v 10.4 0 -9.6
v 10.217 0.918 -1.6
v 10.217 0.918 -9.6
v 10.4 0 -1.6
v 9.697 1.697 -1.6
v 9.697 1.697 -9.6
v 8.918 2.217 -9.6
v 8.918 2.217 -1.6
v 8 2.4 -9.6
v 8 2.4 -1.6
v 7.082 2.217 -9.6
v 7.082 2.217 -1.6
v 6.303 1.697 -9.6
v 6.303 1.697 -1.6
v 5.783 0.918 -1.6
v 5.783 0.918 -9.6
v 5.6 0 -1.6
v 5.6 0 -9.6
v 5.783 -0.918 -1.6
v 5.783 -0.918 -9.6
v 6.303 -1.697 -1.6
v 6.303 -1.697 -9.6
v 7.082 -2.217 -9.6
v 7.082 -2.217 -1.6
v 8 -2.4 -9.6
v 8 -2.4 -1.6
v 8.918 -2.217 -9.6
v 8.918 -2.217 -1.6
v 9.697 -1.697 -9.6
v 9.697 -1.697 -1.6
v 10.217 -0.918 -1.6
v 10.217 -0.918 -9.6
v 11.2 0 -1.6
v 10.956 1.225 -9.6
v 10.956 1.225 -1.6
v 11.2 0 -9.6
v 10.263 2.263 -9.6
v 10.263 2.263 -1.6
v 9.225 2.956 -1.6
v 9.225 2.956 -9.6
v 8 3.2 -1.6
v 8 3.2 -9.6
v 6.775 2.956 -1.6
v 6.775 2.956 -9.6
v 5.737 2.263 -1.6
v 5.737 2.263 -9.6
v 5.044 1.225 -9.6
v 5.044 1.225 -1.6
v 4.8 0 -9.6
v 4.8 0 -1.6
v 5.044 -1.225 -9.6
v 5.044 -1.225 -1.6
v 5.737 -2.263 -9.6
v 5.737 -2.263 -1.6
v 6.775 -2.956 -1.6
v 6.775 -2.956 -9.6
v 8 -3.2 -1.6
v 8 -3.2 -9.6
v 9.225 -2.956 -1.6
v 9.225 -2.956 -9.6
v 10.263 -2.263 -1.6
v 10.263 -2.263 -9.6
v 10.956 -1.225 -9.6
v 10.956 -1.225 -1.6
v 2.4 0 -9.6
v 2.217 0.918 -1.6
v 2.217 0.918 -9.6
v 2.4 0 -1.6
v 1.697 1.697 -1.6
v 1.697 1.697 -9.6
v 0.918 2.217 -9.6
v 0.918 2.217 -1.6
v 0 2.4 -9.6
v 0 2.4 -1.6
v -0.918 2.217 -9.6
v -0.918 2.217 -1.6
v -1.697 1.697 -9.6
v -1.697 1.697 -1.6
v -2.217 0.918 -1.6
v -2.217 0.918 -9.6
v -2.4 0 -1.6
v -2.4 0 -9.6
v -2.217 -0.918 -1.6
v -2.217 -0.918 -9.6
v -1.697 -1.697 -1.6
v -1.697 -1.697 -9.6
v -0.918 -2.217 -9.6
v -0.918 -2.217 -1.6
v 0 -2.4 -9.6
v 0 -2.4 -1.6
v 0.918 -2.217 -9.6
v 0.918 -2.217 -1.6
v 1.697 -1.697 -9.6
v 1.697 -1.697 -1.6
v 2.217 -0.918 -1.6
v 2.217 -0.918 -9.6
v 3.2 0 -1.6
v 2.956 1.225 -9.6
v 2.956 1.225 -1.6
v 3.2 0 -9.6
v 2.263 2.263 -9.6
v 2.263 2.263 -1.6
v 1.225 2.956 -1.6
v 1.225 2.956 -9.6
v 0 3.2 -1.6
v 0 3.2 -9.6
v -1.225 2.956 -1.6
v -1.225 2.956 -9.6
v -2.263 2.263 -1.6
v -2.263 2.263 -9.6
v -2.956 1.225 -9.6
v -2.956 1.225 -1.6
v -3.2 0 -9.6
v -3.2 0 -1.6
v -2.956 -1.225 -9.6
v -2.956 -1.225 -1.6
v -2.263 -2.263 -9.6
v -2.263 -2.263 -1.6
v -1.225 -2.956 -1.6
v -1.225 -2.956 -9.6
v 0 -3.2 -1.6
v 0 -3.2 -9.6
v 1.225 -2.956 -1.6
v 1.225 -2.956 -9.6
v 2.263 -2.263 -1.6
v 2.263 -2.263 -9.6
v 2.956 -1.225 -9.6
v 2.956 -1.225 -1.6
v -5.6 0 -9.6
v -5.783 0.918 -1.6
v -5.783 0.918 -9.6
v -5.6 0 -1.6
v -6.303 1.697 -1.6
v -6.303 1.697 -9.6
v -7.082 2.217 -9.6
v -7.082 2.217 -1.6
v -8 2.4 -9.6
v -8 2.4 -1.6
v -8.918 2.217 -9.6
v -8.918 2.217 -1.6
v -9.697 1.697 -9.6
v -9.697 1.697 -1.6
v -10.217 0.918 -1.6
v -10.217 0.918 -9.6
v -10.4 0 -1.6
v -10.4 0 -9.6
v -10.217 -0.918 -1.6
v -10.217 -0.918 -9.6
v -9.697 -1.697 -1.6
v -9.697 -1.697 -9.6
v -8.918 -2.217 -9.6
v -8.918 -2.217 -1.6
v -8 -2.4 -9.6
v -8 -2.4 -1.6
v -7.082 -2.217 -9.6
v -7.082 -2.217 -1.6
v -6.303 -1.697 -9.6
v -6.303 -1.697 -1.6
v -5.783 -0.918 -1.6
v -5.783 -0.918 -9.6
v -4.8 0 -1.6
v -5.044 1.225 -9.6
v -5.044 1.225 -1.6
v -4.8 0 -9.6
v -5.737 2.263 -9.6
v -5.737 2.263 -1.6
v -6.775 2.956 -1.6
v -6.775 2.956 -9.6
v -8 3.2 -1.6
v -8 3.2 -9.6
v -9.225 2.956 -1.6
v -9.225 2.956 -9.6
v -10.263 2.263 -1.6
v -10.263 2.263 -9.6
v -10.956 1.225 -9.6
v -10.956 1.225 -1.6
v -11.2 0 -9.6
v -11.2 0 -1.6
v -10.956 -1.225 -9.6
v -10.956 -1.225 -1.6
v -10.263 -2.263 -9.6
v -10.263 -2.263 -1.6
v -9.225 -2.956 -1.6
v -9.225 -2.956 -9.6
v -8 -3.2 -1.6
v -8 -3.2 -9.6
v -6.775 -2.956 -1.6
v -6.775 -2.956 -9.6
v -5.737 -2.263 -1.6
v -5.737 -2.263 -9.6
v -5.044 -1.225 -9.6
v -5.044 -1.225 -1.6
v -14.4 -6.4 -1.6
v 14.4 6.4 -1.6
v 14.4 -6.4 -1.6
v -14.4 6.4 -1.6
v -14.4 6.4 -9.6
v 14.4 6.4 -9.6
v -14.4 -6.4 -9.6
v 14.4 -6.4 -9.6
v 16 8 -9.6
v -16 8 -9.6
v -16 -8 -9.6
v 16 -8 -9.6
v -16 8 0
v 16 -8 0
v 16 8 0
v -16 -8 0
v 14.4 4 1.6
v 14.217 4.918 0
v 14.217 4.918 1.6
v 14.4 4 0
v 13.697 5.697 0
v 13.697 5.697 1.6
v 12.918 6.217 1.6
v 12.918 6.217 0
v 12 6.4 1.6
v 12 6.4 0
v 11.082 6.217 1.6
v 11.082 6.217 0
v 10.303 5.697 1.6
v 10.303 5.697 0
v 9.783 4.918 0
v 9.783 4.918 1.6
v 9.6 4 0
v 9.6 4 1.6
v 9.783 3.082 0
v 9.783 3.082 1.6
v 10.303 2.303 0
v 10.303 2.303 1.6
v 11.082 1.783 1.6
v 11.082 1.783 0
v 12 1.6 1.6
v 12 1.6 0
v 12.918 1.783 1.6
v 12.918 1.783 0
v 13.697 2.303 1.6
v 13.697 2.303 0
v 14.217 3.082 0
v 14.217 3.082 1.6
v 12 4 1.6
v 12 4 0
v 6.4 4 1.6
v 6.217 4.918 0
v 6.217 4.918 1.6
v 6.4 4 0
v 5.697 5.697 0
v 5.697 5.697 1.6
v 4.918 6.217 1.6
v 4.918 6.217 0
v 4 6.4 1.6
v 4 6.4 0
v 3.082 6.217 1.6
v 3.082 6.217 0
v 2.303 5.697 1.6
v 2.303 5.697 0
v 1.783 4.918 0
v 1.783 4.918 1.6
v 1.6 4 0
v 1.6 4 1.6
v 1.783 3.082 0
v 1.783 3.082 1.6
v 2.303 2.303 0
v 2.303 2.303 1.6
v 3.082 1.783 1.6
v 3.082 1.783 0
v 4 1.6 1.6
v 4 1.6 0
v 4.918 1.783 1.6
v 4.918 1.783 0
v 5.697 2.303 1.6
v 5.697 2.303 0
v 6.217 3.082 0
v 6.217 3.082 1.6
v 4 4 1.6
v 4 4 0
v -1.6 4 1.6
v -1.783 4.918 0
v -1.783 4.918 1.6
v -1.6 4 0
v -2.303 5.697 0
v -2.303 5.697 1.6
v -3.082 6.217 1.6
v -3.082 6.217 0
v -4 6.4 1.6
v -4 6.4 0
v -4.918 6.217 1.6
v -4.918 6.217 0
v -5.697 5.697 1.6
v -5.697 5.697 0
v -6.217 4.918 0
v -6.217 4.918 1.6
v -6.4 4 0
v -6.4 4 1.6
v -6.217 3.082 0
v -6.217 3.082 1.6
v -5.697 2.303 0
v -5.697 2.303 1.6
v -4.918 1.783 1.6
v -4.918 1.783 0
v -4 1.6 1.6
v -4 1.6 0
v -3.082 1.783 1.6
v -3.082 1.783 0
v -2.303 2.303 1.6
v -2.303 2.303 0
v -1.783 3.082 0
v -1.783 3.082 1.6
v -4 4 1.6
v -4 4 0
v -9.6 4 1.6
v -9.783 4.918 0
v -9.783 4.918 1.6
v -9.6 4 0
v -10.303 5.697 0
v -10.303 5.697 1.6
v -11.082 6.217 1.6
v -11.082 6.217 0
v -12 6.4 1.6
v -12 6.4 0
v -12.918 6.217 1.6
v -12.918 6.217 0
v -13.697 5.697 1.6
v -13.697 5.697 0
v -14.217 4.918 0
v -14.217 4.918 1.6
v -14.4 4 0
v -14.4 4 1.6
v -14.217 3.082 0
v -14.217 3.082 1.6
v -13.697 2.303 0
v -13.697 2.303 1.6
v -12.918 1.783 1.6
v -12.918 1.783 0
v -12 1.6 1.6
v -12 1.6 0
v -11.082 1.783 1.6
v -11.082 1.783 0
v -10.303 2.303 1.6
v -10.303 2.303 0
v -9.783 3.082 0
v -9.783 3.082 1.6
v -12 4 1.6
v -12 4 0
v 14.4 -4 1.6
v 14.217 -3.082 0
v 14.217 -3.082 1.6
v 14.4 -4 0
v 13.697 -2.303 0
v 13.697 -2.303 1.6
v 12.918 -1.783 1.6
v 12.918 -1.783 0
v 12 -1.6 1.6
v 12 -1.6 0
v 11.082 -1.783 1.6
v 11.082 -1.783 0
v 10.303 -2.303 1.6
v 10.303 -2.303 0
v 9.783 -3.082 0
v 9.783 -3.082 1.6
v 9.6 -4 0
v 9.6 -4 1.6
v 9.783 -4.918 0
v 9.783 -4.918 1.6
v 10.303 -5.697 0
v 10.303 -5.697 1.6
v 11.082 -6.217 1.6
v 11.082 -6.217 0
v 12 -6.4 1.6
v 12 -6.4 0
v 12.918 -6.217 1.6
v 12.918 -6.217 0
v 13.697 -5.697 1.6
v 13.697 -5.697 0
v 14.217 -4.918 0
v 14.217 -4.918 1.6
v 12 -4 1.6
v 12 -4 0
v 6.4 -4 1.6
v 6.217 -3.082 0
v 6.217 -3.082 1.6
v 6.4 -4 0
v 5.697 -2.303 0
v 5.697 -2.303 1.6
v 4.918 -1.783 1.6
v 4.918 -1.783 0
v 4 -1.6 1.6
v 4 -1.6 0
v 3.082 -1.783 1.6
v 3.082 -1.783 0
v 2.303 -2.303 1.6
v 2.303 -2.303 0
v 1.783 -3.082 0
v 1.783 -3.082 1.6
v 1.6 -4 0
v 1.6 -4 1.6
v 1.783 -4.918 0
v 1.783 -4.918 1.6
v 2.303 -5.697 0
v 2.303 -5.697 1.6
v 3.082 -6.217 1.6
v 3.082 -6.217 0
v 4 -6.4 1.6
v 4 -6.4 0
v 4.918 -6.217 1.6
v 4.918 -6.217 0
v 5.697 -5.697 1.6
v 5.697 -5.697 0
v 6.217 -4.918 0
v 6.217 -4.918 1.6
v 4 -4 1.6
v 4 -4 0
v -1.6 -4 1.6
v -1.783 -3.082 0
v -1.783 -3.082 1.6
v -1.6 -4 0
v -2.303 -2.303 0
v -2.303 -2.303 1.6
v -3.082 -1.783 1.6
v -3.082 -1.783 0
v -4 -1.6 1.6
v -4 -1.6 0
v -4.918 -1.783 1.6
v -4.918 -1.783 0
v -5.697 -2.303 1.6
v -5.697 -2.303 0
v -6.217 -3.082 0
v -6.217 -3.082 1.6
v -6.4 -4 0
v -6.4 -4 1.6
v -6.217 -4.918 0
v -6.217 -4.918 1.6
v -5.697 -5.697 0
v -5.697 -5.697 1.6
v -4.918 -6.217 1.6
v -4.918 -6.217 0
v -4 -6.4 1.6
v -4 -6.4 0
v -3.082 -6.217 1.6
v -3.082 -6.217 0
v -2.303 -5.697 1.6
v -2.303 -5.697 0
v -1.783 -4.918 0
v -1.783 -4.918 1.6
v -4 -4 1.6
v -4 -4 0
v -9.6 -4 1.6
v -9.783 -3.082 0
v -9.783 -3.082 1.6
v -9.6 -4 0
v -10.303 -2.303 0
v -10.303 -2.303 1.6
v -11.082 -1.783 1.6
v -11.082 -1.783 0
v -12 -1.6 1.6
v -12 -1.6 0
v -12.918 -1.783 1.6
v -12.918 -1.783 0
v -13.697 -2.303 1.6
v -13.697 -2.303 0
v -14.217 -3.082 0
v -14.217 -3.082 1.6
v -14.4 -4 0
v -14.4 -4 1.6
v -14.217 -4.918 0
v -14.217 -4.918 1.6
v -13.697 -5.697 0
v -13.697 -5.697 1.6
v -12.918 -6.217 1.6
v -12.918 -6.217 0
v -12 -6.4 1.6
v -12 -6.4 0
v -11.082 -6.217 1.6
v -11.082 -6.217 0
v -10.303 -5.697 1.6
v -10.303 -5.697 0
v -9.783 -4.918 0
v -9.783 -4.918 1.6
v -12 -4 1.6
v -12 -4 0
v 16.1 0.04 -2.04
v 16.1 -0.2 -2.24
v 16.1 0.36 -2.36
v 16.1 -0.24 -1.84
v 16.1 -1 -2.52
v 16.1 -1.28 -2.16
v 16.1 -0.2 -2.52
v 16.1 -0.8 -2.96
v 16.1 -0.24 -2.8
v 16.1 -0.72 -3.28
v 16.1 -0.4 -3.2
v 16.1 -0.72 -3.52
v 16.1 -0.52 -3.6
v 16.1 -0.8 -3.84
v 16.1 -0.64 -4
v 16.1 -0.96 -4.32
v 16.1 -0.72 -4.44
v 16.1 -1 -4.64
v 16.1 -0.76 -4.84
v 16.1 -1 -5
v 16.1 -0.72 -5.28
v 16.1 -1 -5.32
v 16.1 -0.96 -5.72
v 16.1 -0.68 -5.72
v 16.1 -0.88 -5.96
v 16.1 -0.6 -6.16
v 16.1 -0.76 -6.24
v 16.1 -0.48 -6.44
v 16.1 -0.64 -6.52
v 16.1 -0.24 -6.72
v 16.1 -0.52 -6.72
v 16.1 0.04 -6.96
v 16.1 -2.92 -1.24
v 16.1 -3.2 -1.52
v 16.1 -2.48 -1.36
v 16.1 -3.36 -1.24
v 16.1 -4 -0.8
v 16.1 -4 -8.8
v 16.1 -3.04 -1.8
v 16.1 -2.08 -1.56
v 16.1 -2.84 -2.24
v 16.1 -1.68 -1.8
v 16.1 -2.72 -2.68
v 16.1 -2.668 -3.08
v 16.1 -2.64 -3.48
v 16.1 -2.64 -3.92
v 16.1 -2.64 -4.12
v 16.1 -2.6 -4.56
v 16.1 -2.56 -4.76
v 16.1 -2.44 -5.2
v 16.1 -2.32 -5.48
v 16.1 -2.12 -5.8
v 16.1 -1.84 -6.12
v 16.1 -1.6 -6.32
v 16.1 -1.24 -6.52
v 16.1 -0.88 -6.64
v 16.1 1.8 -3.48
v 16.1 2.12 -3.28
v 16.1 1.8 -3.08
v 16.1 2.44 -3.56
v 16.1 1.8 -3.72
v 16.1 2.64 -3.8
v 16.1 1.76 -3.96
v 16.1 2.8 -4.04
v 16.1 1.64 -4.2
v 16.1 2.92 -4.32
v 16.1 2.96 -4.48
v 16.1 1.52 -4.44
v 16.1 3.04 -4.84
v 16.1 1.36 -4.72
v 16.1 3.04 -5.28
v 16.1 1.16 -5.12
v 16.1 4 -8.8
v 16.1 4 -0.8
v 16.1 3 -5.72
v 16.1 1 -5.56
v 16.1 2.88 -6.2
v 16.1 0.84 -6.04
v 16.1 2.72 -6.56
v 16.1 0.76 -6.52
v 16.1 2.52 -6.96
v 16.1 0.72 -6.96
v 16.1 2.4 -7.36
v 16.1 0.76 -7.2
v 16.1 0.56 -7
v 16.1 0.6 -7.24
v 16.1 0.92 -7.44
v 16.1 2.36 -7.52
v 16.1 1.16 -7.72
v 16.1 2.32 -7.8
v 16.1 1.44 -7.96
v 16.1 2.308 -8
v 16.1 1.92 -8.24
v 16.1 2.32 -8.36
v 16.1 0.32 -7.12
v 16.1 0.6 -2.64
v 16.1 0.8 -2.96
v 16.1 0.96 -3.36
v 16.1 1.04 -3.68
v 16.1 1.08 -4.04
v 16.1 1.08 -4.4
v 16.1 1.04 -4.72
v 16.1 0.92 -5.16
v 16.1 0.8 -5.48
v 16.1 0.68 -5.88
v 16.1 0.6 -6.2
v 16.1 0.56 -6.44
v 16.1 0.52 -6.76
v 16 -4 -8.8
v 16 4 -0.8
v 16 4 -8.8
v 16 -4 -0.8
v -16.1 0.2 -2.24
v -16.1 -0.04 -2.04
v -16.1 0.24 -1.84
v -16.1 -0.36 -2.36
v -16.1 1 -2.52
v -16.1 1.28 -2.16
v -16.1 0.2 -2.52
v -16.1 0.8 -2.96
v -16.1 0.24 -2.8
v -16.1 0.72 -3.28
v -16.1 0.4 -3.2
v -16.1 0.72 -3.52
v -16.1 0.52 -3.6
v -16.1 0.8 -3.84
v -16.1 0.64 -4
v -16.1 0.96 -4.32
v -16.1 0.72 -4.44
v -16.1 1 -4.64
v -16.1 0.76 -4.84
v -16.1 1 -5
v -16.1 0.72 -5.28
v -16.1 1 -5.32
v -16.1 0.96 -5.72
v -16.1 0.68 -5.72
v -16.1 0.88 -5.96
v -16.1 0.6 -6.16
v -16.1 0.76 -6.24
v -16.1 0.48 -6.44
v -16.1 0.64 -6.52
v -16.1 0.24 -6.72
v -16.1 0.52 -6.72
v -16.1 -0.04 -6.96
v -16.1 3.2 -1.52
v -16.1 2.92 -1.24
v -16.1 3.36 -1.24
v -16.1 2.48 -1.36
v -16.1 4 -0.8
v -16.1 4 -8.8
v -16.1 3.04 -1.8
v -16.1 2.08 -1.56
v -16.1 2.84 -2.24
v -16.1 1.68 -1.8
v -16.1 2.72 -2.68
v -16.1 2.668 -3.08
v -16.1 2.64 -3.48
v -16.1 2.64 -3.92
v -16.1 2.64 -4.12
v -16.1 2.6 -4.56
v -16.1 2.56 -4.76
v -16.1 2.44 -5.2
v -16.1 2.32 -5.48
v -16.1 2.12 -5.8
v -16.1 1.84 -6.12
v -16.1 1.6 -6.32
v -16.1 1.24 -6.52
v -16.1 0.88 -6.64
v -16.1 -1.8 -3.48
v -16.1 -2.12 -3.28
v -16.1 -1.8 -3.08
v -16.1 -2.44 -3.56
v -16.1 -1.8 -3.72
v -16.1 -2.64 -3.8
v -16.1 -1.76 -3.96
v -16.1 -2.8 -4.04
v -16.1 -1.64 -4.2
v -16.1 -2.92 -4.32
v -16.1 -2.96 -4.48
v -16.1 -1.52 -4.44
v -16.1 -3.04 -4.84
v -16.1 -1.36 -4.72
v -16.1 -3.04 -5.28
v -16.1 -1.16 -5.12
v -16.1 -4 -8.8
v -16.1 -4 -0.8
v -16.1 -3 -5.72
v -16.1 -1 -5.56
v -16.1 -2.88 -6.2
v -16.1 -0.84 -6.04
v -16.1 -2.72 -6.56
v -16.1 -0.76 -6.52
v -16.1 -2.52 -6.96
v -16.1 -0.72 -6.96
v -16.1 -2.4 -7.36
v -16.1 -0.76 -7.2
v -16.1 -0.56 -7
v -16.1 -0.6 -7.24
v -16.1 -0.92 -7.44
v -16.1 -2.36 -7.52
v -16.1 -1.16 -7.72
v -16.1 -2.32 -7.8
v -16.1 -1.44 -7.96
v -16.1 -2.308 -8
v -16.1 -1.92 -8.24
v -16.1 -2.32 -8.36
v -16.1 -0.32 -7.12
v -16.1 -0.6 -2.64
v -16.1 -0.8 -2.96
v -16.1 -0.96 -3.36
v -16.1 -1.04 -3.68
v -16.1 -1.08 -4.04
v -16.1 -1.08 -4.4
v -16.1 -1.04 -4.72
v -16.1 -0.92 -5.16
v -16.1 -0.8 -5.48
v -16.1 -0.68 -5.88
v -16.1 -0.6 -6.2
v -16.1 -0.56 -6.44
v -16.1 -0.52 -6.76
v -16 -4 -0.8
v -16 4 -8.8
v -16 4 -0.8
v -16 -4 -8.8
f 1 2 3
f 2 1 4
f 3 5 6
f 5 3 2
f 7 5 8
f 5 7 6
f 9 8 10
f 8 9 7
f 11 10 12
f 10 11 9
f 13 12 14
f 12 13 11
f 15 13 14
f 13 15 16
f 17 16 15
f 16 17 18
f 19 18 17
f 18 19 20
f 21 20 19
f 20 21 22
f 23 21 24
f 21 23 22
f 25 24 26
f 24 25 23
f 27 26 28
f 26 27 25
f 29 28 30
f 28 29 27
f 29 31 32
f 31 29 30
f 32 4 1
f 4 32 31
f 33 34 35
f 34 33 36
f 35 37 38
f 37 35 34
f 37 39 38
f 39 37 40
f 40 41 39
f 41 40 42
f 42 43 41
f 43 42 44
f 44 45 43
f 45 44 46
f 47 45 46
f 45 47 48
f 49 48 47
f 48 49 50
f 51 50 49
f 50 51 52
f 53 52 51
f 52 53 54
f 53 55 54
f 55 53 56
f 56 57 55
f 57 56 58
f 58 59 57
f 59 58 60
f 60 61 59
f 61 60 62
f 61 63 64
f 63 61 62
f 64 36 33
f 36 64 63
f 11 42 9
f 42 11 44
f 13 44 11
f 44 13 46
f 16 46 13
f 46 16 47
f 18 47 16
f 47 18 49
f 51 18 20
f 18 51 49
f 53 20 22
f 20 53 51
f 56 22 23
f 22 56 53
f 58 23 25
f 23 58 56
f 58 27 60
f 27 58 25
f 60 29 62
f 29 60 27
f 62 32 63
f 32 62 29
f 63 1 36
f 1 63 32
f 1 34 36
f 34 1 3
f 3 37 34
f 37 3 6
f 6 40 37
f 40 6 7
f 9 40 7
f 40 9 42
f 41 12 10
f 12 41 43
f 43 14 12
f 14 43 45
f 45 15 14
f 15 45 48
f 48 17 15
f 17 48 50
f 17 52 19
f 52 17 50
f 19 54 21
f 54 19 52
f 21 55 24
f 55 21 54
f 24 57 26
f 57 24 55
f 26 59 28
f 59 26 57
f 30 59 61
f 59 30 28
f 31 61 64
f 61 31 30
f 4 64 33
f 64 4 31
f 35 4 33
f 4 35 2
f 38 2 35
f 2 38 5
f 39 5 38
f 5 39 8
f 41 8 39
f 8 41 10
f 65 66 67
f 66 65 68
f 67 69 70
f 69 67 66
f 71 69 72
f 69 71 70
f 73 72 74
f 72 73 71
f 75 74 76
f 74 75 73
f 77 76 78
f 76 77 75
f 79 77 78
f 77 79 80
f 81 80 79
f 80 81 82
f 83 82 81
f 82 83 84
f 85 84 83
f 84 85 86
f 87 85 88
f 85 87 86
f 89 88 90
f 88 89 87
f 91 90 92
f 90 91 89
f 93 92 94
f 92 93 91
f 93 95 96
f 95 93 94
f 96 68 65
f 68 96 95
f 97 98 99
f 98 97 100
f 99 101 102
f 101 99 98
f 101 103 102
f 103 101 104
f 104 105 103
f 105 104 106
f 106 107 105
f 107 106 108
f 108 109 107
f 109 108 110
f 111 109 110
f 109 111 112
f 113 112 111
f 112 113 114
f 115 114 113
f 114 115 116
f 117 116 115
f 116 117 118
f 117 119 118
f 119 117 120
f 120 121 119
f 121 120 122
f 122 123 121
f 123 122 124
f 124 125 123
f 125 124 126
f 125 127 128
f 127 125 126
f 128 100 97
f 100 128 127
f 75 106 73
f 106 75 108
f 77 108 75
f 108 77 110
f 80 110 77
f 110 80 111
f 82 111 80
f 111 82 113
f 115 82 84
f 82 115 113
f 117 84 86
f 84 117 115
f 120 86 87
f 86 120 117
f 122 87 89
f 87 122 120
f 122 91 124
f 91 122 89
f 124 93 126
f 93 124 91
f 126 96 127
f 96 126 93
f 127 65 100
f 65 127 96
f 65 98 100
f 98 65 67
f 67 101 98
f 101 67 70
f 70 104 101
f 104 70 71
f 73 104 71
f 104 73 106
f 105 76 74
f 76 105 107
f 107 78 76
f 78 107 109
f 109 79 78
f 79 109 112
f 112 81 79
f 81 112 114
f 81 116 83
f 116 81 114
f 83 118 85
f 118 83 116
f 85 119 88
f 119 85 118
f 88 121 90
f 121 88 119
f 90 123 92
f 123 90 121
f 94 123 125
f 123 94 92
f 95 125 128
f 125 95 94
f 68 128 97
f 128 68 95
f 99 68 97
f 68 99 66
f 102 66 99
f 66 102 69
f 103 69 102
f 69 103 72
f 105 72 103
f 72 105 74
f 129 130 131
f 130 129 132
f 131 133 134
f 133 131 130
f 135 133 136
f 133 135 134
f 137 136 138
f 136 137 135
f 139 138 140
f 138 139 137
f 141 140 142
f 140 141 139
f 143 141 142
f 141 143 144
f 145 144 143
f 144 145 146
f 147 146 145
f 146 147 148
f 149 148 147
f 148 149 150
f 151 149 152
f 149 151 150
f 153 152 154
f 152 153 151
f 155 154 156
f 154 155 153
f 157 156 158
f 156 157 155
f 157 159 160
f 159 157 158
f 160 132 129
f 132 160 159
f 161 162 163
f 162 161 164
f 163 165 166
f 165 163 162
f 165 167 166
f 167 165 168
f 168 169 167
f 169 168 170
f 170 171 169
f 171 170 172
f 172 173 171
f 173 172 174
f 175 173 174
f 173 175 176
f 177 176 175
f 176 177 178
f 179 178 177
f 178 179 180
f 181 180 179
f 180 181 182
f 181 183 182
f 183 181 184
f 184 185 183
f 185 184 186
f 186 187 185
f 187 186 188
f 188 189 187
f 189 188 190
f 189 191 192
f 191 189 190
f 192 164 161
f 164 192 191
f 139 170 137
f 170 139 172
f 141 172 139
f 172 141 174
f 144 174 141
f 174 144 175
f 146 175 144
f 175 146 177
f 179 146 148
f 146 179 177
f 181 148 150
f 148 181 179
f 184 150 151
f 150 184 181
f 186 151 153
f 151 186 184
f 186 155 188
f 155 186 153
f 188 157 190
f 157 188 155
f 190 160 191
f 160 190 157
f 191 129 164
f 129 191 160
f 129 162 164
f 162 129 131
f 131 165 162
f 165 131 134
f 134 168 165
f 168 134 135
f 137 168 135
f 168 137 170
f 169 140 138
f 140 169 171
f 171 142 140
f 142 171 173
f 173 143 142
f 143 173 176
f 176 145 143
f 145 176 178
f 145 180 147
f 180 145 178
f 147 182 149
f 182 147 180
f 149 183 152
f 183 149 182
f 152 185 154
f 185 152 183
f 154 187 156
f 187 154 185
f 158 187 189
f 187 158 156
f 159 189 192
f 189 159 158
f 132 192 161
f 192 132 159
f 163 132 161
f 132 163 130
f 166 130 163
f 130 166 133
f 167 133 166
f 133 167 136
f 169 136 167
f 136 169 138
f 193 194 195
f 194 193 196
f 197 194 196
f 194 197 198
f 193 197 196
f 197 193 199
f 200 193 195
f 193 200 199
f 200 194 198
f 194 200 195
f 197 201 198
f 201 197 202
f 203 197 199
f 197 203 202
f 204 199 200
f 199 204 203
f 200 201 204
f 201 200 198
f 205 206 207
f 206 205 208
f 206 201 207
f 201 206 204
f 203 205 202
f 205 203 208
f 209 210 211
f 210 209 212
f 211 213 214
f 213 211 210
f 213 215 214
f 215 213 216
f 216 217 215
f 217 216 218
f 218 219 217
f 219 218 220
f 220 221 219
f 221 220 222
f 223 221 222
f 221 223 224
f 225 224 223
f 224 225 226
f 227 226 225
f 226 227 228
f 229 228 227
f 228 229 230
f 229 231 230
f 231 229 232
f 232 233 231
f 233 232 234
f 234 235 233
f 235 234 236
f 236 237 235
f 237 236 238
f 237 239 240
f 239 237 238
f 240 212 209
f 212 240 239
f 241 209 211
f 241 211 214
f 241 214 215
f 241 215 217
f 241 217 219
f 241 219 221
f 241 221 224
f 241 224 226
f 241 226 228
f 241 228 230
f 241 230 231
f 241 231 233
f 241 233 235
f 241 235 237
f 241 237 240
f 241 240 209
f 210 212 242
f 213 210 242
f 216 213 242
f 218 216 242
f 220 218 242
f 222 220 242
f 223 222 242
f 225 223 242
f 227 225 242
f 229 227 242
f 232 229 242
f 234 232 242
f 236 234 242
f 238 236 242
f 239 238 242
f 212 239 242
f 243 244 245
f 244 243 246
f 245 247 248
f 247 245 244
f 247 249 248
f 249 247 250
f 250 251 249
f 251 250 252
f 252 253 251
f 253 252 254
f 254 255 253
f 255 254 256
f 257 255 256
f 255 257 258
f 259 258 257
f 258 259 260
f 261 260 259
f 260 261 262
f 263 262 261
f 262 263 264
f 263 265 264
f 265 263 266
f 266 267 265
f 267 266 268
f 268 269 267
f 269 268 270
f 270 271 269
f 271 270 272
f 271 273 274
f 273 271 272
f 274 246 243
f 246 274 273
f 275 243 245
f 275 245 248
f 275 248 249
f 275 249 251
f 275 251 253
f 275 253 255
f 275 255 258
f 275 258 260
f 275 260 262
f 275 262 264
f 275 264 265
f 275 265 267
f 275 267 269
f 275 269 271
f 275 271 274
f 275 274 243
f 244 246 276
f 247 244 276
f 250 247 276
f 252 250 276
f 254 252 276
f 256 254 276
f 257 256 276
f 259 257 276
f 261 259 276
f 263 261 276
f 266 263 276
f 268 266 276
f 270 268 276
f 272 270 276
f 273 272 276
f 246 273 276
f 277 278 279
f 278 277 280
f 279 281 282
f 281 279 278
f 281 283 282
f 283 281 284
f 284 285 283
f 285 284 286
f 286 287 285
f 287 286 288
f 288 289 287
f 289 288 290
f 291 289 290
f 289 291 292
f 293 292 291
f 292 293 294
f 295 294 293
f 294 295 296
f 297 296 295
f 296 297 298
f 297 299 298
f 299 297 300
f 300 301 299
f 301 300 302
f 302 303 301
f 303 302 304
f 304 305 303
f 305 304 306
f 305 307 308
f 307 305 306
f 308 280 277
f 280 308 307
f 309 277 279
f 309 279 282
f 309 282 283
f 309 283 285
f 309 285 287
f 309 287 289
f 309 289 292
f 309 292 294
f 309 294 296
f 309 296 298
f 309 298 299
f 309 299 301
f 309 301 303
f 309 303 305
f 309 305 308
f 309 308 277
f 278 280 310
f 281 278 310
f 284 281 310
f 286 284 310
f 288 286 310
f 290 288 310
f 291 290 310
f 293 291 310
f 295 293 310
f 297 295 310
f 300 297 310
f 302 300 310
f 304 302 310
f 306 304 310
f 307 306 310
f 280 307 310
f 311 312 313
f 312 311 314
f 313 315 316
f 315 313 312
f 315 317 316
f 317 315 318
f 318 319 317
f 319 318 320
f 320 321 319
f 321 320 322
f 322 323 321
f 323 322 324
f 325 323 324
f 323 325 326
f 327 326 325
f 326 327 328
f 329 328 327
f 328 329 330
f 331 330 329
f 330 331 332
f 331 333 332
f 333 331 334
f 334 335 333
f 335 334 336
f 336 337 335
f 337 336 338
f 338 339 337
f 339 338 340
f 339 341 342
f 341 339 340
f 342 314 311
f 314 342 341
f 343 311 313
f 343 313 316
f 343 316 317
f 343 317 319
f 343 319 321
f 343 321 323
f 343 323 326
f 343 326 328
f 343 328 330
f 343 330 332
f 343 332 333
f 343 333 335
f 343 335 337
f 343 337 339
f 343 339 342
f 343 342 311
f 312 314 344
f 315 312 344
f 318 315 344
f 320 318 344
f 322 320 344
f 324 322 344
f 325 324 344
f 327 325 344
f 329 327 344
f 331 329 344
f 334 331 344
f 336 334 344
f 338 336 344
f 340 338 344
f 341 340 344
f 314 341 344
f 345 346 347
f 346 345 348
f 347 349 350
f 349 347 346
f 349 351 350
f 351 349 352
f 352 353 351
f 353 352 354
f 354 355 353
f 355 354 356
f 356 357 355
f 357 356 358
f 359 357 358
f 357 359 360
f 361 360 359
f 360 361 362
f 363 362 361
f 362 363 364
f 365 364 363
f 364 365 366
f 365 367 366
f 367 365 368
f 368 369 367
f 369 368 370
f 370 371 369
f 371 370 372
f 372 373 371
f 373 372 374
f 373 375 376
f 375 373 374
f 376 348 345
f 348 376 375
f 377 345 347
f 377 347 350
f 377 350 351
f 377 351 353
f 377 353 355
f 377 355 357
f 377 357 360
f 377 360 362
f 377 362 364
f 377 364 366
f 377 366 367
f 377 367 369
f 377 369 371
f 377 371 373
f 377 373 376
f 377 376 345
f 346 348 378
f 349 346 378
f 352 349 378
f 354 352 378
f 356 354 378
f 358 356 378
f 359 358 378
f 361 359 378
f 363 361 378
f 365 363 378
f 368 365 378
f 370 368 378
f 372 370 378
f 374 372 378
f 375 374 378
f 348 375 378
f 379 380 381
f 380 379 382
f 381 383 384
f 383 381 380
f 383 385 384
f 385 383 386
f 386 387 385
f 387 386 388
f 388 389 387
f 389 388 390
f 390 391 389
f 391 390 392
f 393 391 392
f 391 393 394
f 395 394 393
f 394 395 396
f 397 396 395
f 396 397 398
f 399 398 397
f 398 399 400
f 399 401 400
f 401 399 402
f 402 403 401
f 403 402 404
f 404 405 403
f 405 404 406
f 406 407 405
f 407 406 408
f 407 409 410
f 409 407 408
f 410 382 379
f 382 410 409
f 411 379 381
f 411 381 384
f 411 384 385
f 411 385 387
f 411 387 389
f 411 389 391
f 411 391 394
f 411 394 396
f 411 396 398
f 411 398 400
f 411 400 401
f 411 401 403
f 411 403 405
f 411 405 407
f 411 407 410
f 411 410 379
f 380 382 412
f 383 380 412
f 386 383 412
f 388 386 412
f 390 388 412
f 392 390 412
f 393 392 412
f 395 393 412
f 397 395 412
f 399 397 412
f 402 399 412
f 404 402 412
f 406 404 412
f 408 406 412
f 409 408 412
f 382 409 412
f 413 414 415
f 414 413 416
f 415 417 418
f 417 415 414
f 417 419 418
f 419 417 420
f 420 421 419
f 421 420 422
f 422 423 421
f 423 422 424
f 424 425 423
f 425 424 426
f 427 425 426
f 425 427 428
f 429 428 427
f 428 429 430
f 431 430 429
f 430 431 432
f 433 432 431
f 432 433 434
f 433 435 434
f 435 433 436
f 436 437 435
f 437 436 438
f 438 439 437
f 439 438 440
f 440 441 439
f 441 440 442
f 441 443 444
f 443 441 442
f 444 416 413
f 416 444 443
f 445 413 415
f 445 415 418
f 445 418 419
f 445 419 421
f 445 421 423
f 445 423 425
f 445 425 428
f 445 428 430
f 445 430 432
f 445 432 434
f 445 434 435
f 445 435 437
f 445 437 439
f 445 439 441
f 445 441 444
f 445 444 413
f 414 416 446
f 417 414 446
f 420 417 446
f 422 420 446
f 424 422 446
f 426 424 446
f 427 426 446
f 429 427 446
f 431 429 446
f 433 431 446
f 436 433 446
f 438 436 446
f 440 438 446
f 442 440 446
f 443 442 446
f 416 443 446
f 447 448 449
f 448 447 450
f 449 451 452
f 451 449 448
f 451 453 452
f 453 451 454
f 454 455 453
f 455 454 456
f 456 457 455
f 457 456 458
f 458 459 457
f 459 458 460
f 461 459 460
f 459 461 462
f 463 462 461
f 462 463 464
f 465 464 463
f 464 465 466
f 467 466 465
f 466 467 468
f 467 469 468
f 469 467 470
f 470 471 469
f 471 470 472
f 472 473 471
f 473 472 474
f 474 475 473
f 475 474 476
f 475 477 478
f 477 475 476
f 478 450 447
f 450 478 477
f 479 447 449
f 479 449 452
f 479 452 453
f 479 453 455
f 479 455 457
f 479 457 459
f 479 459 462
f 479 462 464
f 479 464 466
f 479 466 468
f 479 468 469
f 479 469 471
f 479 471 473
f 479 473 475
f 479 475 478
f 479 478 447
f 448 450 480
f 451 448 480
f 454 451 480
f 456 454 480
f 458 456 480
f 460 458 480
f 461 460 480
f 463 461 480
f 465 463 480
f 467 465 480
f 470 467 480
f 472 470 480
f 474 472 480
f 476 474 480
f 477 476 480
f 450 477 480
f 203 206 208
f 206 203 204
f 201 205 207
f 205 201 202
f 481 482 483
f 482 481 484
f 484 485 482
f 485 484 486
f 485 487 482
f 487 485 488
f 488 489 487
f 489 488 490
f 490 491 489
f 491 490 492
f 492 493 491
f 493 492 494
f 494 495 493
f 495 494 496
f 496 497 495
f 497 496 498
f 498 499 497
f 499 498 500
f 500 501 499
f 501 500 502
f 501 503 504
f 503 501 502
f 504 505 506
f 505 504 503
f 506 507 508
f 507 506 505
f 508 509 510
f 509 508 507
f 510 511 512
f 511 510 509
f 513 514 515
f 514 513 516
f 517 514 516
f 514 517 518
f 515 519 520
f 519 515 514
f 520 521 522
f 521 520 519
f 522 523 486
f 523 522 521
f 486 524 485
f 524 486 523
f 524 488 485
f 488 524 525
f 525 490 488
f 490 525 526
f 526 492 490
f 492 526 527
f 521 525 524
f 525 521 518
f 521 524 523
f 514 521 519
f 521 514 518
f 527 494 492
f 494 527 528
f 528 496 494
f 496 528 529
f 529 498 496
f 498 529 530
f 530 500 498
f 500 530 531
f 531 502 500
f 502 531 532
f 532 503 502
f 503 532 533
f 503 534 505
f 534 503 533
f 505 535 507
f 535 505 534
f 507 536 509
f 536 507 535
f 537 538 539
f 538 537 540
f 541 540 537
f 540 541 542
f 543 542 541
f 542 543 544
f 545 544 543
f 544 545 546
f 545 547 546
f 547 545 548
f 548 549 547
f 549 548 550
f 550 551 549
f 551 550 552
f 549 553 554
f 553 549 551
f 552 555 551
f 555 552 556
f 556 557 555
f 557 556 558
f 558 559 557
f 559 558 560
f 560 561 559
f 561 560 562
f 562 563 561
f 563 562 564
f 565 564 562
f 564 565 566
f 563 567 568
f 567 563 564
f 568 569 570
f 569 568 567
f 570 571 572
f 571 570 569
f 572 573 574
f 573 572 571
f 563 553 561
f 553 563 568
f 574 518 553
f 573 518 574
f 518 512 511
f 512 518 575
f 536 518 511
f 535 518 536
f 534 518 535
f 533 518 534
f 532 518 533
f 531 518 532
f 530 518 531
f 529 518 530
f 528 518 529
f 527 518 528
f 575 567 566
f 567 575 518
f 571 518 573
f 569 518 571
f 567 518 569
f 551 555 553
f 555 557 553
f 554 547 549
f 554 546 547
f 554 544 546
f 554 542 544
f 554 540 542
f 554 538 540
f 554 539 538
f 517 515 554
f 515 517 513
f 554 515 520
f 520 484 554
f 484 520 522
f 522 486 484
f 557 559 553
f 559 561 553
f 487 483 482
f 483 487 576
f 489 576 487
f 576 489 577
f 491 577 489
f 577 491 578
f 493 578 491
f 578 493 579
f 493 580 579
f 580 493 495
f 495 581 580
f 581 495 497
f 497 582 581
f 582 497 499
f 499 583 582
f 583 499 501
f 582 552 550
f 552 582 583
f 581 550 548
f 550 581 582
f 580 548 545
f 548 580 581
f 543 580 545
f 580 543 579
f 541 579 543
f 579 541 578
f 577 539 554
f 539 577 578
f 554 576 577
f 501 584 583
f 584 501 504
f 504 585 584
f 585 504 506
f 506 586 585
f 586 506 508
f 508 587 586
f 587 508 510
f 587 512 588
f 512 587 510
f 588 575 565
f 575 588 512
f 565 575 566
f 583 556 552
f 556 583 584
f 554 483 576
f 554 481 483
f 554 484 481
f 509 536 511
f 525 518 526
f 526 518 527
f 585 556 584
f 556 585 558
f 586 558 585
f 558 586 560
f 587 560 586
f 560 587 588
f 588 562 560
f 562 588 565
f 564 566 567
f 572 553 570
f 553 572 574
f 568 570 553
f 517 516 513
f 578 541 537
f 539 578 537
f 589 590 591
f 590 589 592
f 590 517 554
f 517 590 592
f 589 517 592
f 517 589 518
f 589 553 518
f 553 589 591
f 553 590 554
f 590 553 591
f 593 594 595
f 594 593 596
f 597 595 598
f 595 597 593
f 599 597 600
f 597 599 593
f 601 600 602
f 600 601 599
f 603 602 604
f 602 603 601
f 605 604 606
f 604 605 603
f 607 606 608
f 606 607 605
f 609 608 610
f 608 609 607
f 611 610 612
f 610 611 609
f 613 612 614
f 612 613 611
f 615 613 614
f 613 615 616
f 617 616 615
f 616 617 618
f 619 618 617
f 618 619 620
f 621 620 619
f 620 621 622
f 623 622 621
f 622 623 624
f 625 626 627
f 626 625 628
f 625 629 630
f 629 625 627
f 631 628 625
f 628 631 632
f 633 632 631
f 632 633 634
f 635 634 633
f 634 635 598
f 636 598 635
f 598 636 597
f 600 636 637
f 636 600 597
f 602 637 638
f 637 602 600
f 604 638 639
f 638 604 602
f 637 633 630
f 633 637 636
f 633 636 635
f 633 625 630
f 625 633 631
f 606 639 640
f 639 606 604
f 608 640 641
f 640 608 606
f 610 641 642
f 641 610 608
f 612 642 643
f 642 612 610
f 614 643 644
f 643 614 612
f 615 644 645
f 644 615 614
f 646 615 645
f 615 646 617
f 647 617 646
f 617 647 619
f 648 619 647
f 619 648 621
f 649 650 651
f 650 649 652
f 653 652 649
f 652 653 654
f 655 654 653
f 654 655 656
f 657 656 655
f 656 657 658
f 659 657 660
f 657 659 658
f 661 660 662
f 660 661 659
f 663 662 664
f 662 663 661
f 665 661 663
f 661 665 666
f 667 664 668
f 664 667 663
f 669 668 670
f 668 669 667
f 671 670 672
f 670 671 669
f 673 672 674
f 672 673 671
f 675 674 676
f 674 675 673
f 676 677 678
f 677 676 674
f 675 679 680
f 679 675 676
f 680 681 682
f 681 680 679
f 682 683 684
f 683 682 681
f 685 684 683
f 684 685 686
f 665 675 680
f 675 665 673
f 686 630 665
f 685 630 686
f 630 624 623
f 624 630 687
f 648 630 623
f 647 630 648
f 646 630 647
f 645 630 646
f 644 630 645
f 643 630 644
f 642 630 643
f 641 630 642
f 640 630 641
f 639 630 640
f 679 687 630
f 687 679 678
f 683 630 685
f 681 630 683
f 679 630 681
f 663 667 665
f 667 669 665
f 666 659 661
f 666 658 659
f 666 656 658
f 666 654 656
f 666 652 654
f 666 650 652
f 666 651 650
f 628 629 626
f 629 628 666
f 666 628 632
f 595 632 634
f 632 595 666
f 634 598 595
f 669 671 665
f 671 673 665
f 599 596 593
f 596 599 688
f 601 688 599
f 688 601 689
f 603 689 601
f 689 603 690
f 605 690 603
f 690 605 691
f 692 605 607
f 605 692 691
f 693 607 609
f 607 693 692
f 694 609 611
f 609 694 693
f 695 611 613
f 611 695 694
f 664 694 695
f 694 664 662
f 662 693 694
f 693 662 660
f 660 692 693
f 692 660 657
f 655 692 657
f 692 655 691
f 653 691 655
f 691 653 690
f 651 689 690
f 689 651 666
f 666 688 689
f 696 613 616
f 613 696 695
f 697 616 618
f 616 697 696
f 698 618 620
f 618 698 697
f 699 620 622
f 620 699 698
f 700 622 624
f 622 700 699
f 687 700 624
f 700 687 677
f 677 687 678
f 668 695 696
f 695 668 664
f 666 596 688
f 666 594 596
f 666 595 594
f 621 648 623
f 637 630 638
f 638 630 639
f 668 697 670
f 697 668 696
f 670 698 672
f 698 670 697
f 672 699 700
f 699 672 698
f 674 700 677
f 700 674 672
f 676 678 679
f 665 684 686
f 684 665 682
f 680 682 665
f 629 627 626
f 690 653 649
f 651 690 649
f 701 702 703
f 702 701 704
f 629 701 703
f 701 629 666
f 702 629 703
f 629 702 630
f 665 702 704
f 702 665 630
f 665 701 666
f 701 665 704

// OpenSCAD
use <../lib.scad>
use <004659a.scad>
use <3001.scad>
function ldraw_lib__3001d04() = [
// 0 Brick  2 x  4 with Fire Logo Sticker on Both Ends
// 0 Name: 3001d04.dat
// 0 Author: Takeshi Takahashi [RainbowDolphin]
// 0 !LDRAW_ORG Shortcut UPDATE 2024-04
// 0 !LICENSE Licensed under CC BY 4.0 : see CAreadme.txt
// 
// 0 BFC CERTIFY CCW
  [0,"BFC","CERTIFY"],
  [0,"BFC","CCW"],
// 
// 0 !CATEGORY Sticker Shortcut
// 0 !KEYWORDS Bricklink 3001oldpb07, Fire engine, Set 590-1
// 
// 0 !HISTORY 2024-05-28 [OrionP] Official Update 2024-04
// 
// 1 16 0 0 0 1 0 0 0 1 0 0 0 1 3001.dat
  [1,16,0,0,0,1,0,0,0,1,0,0,0,1, ldraw_lib__3001()],
// 1 16 40 12 0 0 -1 0 0 0 -1 1 0 0 004659a.dat
  [1,16,40,12,0,0,-1,0,0,0,-1,1,0,0, ldraw_lib__004659a()],
// 1 16 -40 12 0 0 1 0 0 0 -1 -1 0 0 004659a.dat
  [1,16,-40,12,0,0,1,0,0,0,-1,-1,0,0, ldraw_lib__004659a()],
];
module ldraw_lib__3001d04(step=0, col=false, unit=2/5, alt=false, line=0.2, solid=!$preview)
    makepoly(ldraw_lib__3001d04(), step=step, col=col, unit=unit, alt=alt, line=line, solid=solid);
ldraw_lib__3001d04(line=0.2);
